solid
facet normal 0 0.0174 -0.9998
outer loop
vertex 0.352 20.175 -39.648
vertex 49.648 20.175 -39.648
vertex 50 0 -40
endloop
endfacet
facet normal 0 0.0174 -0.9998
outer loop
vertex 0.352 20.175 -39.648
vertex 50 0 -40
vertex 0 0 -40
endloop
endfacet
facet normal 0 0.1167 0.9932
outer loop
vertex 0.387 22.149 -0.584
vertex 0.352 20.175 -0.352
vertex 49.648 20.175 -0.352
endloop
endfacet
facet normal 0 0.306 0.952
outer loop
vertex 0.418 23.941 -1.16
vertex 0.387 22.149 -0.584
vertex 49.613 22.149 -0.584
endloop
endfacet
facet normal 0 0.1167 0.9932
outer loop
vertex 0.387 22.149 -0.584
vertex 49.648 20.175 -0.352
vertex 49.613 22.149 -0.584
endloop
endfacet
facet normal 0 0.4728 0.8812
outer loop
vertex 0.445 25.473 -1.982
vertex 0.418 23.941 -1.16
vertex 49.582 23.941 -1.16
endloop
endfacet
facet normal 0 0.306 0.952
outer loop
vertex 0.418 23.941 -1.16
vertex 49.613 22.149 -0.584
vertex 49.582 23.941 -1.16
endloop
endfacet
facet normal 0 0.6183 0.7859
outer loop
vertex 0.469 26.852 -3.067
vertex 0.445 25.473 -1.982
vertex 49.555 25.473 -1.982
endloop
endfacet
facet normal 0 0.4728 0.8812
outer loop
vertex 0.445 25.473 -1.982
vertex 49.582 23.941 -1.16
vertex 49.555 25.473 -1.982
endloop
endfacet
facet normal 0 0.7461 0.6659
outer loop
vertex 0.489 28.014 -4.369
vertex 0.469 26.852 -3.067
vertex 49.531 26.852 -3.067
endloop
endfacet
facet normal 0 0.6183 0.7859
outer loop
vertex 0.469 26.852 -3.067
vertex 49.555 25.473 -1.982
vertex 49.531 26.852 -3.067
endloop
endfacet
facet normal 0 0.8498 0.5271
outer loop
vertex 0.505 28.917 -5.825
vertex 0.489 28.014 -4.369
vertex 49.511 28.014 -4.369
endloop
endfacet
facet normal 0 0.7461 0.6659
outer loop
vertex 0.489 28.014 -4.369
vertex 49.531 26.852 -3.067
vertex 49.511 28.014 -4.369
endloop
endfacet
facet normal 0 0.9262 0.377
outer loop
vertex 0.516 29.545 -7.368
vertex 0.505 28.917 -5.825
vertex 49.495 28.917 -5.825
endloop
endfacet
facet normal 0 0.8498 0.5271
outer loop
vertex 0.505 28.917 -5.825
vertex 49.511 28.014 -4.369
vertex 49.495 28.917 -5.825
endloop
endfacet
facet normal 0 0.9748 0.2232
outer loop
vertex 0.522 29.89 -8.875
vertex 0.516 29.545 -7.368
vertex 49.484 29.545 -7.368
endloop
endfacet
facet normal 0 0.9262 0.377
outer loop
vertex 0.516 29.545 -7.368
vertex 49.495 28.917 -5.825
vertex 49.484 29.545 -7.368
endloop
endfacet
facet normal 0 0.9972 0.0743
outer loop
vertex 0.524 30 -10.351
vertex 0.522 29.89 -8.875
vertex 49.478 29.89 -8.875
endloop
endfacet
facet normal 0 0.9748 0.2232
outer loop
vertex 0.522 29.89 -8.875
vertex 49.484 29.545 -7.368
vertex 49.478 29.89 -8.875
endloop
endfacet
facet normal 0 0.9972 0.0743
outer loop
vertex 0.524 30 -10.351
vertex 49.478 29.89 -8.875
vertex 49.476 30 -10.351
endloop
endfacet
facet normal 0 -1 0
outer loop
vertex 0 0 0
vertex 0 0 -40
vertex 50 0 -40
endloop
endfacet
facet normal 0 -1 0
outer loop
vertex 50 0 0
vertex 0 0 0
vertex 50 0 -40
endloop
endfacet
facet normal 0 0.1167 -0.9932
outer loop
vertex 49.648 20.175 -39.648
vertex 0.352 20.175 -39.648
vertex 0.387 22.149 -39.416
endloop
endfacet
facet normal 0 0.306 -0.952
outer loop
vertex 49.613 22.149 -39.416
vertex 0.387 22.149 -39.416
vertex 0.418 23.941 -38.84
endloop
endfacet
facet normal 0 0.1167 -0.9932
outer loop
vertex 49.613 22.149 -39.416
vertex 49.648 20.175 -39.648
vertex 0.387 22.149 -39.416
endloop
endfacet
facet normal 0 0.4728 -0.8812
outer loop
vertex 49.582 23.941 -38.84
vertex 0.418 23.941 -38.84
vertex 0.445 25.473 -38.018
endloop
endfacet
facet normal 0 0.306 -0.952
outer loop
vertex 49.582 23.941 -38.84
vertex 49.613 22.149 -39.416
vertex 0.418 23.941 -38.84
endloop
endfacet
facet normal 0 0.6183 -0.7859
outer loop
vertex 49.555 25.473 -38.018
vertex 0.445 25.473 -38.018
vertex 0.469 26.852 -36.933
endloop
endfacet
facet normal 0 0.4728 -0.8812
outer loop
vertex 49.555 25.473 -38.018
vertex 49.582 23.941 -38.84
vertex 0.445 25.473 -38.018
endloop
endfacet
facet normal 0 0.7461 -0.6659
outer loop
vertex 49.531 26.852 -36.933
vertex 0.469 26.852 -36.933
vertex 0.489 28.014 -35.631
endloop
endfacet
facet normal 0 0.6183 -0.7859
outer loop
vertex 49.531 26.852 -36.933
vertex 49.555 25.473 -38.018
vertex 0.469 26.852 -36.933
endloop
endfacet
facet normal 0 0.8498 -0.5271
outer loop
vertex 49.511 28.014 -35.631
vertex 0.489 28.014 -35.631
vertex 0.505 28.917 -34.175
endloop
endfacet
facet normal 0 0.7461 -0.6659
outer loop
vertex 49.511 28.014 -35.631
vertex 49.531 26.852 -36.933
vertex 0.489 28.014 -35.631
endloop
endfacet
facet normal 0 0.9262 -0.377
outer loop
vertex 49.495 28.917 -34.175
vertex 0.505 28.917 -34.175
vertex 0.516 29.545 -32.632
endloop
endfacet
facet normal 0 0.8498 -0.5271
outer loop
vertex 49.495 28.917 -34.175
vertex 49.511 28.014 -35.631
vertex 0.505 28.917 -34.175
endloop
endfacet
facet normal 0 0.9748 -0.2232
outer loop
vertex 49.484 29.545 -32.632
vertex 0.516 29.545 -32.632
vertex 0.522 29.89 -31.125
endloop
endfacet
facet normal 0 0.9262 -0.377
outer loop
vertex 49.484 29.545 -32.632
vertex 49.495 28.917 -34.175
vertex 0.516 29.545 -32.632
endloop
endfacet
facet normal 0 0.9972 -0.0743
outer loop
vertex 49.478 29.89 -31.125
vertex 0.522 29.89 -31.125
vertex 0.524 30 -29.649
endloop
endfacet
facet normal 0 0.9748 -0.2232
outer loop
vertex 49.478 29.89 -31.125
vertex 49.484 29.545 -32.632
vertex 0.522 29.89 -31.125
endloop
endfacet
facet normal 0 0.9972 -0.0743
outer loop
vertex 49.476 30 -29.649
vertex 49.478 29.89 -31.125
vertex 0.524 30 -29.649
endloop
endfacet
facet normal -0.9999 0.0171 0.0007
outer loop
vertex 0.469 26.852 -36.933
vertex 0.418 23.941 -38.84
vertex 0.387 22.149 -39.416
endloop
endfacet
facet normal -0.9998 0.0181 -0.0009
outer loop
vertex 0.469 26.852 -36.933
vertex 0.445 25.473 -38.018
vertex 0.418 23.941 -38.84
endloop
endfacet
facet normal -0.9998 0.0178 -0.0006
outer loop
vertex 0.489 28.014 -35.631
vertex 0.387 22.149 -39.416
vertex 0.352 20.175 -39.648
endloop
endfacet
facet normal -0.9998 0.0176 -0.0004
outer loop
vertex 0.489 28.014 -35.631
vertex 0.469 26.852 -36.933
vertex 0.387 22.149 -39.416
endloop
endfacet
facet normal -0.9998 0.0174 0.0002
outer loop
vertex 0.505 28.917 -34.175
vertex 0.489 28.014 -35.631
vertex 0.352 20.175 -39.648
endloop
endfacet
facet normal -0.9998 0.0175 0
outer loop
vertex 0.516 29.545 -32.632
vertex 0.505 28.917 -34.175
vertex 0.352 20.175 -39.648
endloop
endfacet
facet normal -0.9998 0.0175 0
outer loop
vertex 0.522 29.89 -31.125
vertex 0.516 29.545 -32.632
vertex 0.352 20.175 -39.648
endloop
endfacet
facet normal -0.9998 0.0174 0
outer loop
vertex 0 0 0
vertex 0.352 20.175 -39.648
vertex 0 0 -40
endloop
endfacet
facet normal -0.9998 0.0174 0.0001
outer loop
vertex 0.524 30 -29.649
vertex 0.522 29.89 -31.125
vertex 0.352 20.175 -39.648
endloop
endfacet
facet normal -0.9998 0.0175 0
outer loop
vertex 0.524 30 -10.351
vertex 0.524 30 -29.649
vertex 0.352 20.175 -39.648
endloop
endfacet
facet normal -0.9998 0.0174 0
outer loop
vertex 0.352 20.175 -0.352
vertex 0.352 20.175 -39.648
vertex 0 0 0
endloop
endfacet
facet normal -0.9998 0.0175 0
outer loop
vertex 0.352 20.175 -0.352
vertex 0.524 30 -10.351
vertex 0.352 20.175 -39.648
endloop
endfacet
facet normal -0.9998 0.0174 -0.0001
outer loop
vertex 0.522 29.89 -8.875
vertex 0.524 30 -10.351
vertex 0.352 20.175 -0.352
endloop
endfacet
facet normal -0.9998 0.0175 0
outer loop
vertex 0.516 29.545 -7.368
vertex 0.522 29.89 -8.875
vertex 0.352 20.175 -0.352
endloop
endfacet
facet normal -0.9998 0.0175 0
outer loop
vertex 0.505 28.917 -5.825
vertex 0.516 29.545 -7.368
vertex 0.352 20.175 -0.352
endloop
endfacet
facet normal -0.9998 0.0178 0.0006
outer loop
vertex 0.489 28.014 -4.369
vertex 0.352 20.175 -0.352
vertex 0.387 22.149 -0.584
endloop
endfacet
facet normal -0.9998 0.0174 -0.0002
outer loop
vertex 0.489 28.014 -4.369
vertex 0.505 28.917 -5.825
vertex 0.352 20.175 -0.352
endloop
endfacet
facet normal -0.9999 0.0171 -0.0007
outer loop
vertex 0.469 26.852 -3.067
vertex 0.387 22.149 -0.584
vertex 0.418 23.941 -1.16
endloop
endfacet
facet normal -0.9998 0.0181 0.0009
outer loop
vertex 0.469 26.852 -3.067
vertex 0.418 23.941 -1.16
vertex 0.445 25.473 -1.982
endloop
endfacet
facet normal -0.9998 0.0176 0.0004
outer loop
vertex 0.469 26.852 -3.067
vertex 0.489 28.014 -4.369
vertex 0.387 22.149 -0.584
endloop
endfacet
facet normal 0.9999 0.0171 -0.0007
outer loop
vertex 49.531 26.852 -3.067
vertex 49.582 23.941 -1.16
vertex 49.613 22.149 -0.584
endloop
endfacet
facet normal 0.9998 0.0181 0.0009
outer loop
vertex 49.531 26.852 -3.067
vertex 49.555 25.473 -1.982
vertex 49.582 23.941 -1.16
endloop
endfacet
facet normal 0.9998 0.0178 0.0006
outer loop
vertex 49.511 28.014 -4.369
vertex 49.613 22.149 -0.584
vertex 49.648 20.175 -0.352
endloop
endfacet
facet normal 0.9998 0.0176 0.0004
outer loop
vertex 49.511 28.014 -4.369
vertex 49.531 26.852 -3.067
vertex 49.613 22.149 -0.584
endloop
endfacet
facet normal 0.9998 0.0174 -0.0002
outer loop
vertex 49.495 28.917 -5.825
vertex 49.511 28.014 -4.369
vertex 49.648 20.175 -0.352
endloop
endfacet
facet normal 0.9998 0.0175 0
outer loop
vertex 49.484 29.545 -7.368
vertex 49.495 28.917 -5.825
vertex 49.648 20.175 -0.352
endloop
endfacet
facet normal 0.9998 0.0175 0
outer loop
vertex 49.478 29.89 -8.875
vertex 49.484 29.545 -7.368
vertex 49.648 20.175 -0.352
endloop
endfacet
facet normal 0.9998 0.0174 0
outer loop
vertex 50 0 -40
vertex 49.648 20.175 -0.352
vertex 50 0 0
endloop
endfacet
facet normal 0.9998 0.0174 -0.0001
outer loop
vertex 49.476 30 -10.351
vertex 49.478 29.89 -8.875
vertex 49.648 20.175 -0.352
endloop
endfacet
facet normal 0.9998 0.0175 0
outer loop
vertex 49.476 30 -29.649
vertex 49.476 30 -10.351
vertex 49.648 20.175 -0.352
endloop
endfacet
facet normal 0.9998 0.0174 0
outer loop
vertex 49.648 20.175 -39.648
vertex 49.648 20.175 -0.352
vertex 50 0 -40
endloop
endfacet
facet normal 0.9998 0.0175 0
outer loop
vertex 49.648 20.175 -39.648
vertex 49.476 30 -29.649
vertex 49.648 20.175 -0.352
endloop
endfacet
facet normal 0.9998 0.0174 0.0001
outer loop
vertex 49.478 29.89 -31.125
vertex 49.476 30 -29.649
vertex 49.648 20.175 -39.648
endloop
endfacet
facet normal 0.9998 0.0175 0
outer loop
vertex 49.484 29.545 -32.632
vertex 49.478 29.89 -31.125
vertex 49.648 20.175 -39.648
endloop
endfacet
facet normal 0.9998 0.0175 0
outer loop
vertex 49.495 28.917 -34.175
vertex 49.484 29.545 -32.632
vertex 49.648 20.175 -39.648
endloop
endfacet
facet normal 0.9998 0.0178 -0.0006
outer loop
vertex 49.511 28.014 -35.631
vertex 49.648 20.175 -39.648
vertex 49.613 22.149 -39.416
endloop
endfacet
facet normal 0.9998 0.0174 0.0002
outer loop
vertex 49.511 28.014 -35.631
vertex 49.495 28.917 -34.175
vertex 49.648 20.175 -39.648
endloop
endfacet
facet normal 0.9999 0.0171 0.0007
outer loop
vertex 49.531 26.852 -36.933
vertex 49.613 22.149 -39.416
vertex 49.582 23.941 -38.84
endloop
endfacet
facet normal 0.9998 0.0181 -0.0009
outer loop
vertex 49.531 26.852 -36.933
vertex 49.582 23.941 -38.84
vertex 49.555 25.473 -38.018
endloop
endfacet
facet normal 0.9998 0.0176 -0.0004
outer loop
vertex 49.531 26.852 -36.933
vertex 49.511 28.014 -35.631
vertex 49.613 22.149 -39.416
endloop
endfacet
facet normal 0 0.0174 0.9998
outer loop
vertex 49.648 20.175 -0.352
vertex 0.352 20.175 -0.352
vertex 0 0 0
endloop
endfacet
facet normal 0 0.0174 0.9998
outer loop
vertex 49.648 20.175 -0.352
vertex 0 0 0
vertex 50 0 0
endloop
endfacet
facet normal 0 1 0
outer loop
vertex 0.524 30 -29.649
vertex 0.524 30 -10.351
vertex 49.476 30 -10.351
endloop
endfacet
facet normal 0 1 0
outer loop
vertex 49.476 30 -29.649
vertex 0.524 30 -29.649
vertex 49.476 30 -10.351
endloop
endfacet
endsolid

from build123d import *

# Parameters (mm, degrees)
ESBO_O1_W                = 50
ESBO_O1_H                = 40
RESSALTO_EXTRUS_O1_DEPTH = 30
RESSALTO_EXTRUS_O1_TAPER = 1
FILETE2_R                = 10


with BuildPart() as part:
    # Esboço1 → Ressalto-extrusão1 (new body)
    with BuildSketch(Plane(origin=(0, 0, 0), x_dir=(1, 0, 0), z_dir=(0, 1, 0))):
        with Locations((25, 20)):
            Rectangle(ESBO_O1_W, ESBO_O1_H)
    extrude(amount=RESSALTO_EXTRUS_O1_DEPTH, taper=RESSALTO_EXTRUS_O1_TAPER)

    # Filete2
    filete2_edges = [part.edges().sort_by_distance(p)[0] for p in [
        (25, 30, -39.476348052),
        (25, 30, -0.523651948),
    ]]
    fillet(filete2_edges, radius=FILETE2_R)


solid = part.part
